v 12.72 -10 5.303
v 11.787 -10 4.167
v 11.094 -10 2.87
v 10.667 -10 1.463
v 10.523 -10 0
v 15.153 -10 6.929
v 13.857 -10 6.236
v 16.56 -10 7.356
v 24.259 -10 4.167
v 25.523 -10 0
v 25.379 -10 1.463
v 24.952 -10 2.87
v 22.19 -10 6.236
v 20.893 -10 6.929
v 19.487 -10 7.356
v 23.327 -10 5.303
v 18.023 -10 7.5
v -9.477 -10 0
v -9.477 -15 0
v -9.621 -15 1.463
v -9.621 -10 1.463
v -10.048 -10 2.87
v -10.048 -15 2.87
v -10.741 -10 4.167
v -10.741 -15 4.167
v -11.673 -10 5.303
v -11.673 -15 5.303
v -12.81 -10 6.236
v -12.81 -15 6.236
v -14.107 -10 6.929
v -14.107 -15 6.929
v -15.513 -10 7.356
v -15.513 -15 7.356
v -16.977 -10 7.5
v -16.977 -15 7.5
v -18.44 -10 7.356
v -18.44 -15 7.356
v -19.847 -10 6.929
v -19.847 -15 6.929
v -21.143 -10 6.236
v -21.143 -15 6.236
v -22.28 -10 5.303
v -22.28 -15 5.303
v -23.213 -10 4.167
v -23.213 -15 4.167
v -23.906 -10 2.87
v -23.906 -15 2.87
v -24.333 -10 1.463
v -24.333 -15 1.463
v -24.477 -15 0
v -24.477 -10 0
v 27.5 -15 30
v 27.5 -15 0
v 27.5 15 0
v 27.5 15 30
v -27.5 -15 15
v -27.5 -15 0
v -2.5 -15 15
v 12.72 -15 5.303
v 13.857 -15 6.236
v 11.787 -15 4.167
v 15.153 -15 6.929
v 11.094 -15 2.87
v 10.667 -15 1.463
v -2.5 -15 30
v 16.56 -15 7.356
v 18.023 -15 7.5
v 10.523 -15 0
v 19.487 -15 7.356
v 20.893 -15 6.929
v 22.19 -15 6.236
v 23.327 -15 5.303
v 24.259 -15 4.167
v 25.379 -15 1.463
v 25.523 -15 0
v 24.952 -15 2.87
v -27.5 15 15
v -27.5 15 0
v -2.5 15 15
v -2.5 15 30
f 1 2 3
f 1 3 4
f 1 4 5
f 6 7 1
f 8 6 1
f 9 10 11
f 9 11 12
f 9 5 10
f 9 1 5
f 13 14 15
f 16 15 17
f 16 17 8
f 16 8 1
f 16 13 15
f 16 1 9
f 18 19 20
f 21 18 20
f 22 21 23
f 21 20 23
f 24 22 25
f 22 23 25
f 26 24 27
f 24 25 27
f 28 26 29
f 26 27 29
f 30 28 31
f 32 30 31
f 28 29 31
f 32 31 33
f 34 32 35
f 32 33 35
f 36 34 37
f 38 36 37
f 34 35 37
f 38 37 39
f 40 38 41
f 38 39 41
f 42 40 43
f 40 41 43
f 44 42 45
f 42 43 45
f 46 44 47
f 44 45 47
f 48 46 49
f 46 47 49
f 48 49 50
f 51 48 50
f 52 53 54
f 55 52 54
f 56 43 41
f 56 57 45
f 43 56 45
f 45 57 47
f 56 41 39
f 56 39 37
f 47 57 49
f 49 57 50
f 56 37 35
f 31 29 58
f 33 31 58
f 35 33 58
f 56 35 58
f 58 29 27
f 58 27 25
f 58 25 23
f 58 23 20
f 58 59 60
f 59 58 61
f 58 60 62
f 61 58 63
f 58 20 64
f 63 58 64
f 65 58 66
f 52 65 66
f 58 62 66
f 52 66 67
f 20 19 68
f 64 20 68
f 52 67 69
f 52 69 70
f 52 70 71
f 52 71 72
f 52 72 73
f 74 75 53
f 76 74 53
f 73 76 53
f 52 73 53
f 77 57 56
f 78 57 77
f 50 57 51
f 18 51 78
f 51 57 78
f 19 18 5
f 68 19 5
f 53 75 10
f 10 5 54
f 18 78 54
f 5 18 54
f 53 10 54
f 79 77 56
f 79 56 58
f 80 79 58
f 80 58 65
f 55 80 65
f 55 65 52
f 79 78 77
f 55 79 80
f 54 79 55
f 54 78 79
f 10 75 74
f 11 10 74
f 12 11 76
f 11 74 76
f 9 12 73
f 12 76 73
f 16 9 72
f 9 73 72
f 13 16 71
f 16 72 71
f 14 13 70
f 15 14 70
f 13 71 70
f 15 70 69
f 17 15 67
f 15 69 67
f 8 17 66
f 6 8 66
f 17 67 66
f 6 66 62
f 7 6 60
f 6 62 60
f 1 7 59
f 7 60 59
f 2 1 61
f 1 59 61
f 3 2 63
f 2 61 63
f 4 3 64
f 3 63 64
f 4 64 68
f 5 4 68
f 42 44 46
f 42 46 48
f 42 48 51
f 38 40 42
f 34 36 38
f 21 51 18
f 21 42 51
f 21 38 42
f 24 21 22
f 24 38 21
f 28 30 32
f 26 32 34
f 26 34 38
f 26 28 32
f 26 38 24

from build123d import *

# Parameters (mm, degrees)
F0_W     = 55
F0_H     = 30
F1_DEPTH = 30
F2_W     = 25
F2_H     = 15
F3_DEPTH = 30.001
F5_DEPTH = 5


with BuildPart() as f1:
    # F0 (on Top) → F1 (new body)
    with BuildSketch(Plane.XY):
        Rectangle(F0_W, F0_H)
    extrude(amount=F1_DEPTH)

    # F2 (on face) → F3 (cut, through all)
    with BuildSketch(Plane.XZ.offset(15)):
        with Locations((-15, 22.5)):
            Rectangle(F2_W, F2_H)
    extrude(amount=-F3_DEPTH, mode=Mode.SUBTRACT)

    # F4 (on face) → F5 (cut)
    with BuildSketch(Plane.XZ.offset(15)):
        with BuildLine():
            Line((-24.4766619802, 0), (-9.4766619802, 0))
            ThreePointArc((-9.4766619802, 0), (-16.9766619802, 7.5), (-24.4766619802, 0))
        make_face()
        with BuildLine():
            ThreePointArc((25.5233380198, 0), (18.0233380198, 7.5), (10.5233380198, 0))
            Line((10.5233380198, 0), (25.5233380198, 0))
        make_face()
    extrude(amount=-F5_DEPTH, mode=Mode.SUBTRACT)


solid = f1.part
